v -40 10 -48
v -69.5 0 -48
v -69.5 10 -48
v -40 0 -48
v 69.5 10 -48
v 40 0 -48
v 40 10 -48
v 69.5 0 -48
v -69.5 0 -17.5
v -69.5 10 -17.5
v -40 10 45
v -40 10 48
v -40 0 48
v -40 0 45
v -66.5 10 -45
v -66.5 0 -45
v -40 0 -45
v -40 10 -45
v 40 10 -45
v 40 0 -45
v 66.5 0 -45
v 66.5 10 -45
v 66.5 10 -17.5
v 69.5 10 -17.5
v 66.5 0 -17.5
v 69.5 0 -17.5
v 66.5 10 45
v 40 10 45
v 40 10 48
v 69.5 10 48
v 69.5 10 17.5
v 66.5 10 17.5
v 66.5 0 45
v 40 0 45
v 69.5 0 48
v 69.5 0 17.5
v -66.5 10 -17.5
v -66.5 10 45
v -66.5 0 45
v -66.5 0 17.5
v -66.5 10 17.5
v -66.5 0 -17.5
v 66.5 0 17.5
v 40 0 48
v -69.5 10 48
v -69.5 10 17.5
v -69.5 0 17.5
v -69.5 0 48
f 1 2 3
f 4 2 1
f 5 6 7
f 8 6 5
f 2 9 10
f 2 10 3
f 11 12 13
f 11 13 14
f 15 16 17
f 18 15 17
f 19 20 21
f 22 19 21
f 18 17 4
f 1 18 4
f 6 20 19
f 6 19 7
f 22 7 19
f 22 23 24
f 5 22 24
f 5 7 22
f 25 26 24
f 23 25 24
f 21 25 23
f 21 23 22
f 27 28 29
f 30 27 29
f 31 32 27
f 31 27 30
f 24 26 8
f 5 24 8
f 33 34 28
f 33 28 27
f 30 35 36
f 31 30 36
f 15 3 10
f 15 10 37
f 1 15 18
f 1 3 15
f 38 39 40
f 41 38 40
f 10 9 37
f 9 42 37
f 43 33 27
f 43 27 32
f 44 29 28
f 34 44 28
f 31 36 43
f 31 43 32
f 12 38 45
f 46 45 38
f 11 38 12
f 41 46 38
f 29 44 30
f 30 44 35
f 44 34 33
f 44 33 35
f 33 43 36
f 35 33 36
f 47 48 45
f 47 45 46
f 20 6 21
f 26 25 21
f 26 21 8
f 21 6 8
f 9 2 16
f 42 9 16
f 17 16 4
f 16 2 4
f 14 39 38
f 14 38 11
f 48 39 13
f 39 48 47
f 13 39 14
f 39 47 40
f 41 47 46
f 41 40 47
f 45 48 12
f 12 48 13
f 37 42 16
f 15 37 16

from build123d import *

# Parameters (mm, degrees)
SKETCH1_W           = 139
SKETCH1_H           = 96
SKETCH1_W_2         = 133
SKETCH1_H_2         = 90
BOSS_EXTRUDE1_DEPTH = 10
SKETCH2_W           = 35
SKETCH2_H           = 30
CUT_EXTRUDE1_DEPTH  = 600
SKETCH3_W           = 80
SKETCH3_H           = 120.605427014
CUT_EXTRUDE2_DEPTH  = 50


with BuildPart() as part:
    # Sketch1 → Boss-Extrude1 (new body)
    with BuildSketch(Plane(origin=(0, 0, 0), x_dir=(1, 0, 0), z_dir=(0, 1, 0))):
        Rectangle(SKETCH1_W, SKETCH1_H)
        Rectangle(SKETCH1_W_2, SKETCH1_H_2, mode=Mode.SUBTRACT)
    extrude(amount=BOSS_EXTRUDE1_DEPTH)

    # Sketch2 → Cut-Extrude1 (cut)
    with BuildSketch(Plane(origin=(69.5, 0, 0), x_dir=(0, 0, -1), z_dir=(1, 0, 0))):
        Rectangle(SKETCH2_W, SKETCH2_H)
    extrude(amount=-CUT_EXTRUDE1_DEPTH, mode=Mode.SUBTRACT)

    # Sketch3 → Cut-Extrude2 (cut)
    with BuildSketch(Plane(origin=(0, 10, 0), x_dir=(1, 0, 0), z_dir=(0, 1, 0))):
        with Locations((0, -1.453077434)):
            Rectangle(SKETCH3_W, SKETCH3_H)
    extrude(amount=-CUT_EXTRUDE2_DEPTH, mode=Mode.SUBTRACT)


solid = part.part
